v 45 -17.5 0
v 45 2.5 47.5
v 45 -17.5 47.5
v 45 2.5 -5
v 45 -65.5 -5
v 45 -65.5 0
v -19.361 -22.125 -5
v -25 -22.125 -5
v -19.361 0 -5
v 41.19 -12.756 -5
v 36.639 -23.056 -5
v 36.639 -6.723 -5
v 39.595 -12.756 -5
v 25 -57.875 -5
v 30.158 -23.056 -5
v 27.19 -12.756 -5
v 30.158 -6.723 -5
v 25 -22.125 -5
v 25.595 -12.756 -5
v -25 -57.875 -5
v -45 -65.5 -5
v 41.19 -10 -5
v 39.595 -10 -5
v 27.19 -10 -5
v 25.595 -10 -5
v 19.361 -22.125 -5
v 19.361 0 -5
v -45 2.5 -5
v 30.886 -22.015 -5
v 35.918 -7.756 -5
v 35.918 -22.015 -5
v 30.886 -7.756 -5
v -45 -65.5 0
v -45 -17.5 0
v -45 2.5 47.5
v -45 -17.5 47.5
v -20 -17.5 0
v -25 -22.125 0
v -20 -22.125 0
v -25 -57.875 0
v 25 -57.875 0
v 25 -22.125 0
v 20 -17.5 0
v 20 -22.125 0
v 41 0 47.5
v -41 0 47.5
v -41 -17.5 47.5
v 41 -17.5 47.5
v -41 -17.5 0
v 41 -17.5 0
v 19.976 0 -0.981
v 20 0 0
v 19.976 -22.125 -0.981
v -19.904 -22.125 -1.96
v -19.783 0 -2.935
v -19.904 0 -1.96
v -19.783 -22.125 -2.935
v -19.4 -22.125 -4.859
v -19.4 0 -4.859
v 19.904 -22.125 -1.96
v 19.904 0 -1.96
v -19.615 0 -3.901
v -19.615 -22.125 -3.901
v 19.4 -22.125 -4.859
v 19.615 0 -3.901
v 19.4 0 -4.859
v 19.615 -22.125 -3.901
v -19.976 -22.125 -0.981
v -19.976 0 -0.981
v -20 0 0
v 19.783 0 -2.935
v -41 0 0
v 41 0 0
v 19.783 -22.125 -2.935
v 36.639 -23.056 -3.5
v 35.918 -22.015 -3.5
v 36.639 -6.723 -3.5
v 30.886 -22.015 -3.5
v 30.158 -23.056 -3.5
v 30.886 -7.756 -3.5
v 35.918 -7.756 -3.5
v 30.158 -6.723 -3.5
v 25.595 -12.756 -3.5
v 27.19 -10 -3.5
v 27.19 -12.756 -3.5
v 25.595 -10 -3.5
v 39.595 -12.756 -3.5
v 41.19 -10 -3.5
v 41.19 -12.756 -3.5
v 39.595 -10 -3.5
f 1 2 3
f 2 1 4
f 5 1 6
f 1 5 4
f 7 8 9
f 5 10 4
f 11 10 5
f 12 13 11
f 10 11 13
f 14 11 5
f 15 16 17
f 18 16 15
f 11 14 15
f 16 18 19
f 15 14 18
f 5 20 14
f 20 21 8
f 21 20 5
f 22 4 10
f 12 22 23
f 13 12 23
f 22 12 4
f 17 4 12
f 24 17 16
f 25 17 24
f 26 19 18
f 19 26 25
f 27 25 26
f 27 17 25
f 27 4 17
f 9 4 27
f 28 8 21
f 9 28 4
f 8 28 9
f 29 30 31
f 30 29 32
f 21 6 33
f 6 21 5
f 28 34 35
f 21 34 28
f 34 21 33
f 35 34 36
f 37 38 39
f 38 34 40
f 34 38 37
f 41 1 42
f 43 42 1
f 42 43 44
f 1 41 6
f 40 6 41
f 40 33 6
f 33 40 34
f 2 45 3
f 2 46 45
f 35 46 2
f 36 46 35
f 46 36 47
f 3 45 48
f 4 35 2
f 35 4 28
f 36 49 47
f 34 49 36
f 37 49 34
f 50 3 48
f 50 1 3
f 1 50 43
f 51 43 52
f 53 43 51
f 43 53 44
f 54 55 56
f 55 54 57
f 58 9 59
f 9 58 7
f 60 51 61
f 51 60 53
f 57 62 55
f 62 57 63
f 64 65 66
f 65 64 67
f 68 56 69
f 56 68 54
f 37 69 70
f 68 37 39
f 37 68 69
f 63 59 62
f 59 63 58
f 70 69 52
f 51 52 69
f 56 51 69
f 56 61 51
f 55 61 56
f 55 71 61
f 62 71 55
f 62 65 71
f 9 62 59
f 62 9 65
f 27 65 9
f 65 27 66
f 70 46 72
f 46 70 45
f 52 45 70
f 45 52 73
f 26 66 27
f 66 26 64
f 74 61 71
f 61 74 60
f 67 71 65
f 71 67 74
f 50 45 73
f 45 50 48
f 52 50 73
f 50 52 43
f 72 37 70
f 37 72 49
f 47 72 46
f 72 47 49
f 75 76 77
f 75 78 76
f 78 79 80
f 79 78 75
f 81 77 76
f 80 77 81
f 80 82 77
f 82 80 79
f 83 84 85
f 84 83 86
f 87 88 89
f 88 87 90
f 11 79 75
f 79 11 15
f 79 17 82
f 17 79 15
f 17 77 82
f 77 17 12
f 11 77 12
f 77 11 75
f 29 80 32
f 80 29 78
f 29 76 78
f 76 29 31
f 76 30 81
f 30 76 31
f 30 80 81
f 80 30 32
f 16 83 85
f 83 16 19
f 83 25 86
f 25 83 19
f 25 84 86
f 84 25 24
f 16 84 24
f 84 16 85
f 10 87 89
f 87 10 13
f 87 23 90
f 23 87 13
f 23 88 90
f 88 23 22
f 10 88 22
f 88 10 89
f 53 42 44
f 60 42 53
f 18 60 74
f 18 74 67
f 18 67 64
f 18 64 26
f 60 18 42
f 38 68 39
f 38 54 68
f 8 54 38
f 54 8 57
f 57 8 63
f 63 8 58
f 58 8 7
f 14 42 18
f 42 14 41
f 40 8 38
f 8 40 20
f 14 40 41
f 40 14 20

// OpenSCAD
rotate([90.0, 0.0, 0.0])
{
    difference()
    {
        union()
        {
            translate([0.0, -2.5, 0.0])
            {
                linear_extrude(height = 65.5, twist = 0.0, scale = 1.0, slices = 1, center = false)
                {
                    scale([90.0, 5.0])
                    {
                        M22();
                    }
                }
            }
            rotate([90.0, 0.0, 0.0])
            {
                translate([0.0, 7.5, 0.0])
                {
                    translate([0.0, 0.0, -47.5])
                    {
                        linear_extrude(height = 52.5, twist = 0.0, scale = 1.0, slices = 1, center = false)
                        {
                            scale([90.0, 20.0])
                            {
                                M22();
                            }
                        }
                    }
                }
            }
        }
        linear_extrude(height = 40.0, twist = 0.0, scale = 1.0, slices = 1, center = false)
        {
            scale([40.0, 40.0])
            {
                M490();
            }
        }
        translate([0.0, 41.0, 0.0])
        {
            translate([0.0, 0.0, 40.0])
            {
                rotate([90.0, 0.0, 0.0])
                {
                    linear_extrude(height = 110.0, twist = 0.0, scale = 1.0, slices = 1, center = false)
                    {
                        scale([35.0, 35.0])
                        {
                            M490();
                        }
                    }
                }
            }
        }
        translate([0.0, 30.0, 0.0])
        {
            linear_extrude(height = 80.0, twist = 0.0, scale = 1.0, slices = 1, center = false)
            {
                scale([82.0, 59.999])
                {
                    M22();
                }
            }
        }
        translate([0.0, -5.0, 0.0])
        {
            translate([22.5, 0.0, 0.0])
            {
                translate([0.0, 0.0, 10.0])
                {
                    rotate([0.0, 0.0, 0.0])
                    {
                        rotate([90.0, 0.0, 0.0])
                        {
                            linear_extrude(height = 3.0, twist = 0.0, scale = 1.0, slices = 1, center = true)
                            {
                                union()
                                {
                                    translate([0.0, 0.0])
                                    {
                                        M1035();
                                    }
                                    translate([7.0, 0.0])
                                    {
                                        M1036();
                                    }
                                    translate([14.0, 0.0])
                                    {
                                        M1035();
                                    }
                                }
                            }
                        }
                    }
                }
            }
        }
        translate([0.0, 0.0, 40.0])
        {
            rotate([90.0, 0.0, 0.0])
            {
                linear_extrude(height = 20.0, twist = 0.0, scale = 1.0, slices = 1, center = false)
                {
                    scale([50.0, 35.75])
                    {
                        M22();
                    }
                }
            }
        }
    }
}

module M22()
{
    polygon
    (
        points =
        [
            [-0.5, -0.5], 
            [0.5, -0.5], 
            [0.5, 0.5], 
            [-0.5, 0.5]
        ],
        paths =
        [
            [0, 1, 2, 3]
        ]
    );
}

module M490()
{
    polygon
    (
        points =
        [
            [0.5, 0.0], 
            [0.4993977281025862, 0.024533837163709007], 
            [0.49759236333609846, 0.0490085701647803], 
            [0.4945882549823905, 0.07336523722768087], 
            [0.4903926402016152, 0.09754516100806412], 
            [0.485015626597272, 0.12149008995163194], 
            [0.4784701678661044, 0.14514233862723117], 
            [0.4707720325915104, 0.16844492669611003], 
            [0.46193976625564337, 0.1913417161825449], 
            [0.45199464656172167, 0.21377754671514104], 
            [0.4409606321741775, 0.23569836841299882], 
            [0.42886430500013606, 0.25705137209661083], 
            [0.4157348061512726, 0.2777851165098011], 
            [0.40160376574032247, 0.2978496522462167], 
            [0.3865052266813685, 0.31719664208182274], 
            [0.37047556267747955, 0.33577947742350917], 
            [0.3535533905932738, 0.35355339059327373], 
            [0.33577947742350917, 0.37047556267747955], 
            [0.31719664208182274, 0.3865052266813685], 
            [0.29784965224621673, 0.4016037657403224], 
            [0.27778511650980114, 0.4157348061512726], 
            [0.25705137209661083, 0.42886430500013606], 
            [0.2356983684129989, 0.44096063217417747], 
            [0.2137775467151411, 0.45199464656172167], 
            [0.19134171618254492, 0.46193976625564337], 
            [0.16844492669611003, 0.4707720325915104], 
            [0.14514233862723117, 0.47847016786610447], 
            [0.12149008995163199, 0.485015626597272], 
            [0.09754516100806417, 0.4903926402016152], 
            [0.07336523722768087, 0.4945882549823905], 
            [0.049008570164780385, 0.4975923633360984], 
            [0.024533837163709063, 0.4993977281025862], 
            [3.061616997868383E-17, 0.5], 
            [-0.024533837163709004, 0.4993977281025862], 
            [-0.04900857016478032, 0.49759236333609846], 
            [-0.07336523722768082, 0.4945882549823905], 
            [-0.0975451610080641, 0.4903926402016152], 
            [-0.12149008995163194, 0.485015626597272], 
            [-0.14514233862723108, 0.47847016786610447], 
            [-0.16844492669610997, 0.4707720325915104], 
            [-0.19134171618254486, 0.46193976625564337], 
            [-0.21377754671514093, 0.4519946465617217], 
            [-0.23569836841299885, 0.4409606321741775], 
            [-0.25705137209661083, 0.42886430500013606], 
            [-0.277785116509801, 0.41573480615127273], 
            [-0.2978496522462167, 0.40160376574032247], 
            [-0.3171966420818227, 0.38650522668136855], 
            [-0.3357794774235092, 0.3704755626774795], 
            [-0.35355339059327373, 0.3535533905932738], 
            [-0.37047556267747944, 0.3357794774235093], 
            [-0.3865052266813685, 0.31719664208182274], 
            [-0.4016037657403224, 0.29784965224621673], 
            [-0.4157348061512727, 0.2777851165098011], 
            [-0.428864305000136, 0.2570513720966109], 
            [-0.44096063217417747, 0.23569836841299893], 
            [-0.45199464656172167, 0.21377754671514101], 
            [-0.46193976625564337, 0.19134171618254495], 
            [-0.47077203259151035, 0.16844492669611016], 
            [-0.4784701678661044, 0.1451423386272312], 
            [-0.485015626597272, 0.12149008995163203], 
            [-0.4903926402016152, 0.0975451610080643], 
            [-0.4945882549823905, 0.0733652372276809], 
            [-0.4975923633360984, 0.04900857016478041], 
            [-0.4993977281025862, 0.024533837163708983], 
            [-0.5, 6.123233995736766E-17], 
            [-0.4993977281025862, -0.024533837163708862], 
            [-0.49759236333609846, -0.049008570164780295], 
            [-0.4945882549823905, -0.07336523722768079], 
            [-0.4903926402016152, -0.09754516100806418], 
            [-0.485015626597272, -0.12149008995163191], 
            [-0.47847016786610447, -0.14514233862723105], 
            [-0.4707720325915104, -0.16844492669611005], 
            [-0.4619397662556434, -0.19134171618254484], 
            [-0.4519946465617217, -0.2137775467151409], 
            [-0.4409606321741775, -0.23569836841299882], 
            [-0.42886430500013606, -0.2570513720966108], 
            [-0.41573480615127273, -0.277785116509801], 
            [-0.40160376574032247, -0.2978496522462166], 
            [-0.38650522668136855, -0.31719664208182263], 
            [-0.37047556267747955, -0.3357794774235092], 
            [-0.35355339059327384, -0.35355339059327373], 
            [-0.33577947742350933, -0.37047556267747944], 
            [-0.31719664208182297, -0.38650522668136833], 
            [-0.29784965224621657, -0.4016037657403225], 
            [-0.2777851165098011, -0.4157348061512726], 
            [-0.2570513720966109, -0.428864305000136], 
            [-0.23569836841299893, -0.44096063217417747], 
            [-0.21377754671514124, -0.45199464656172156], 
            [-0.19134171618254517, -0.46193976625564326], 
            [-0.16844492669610997, -0.4707720325915104], 
            [-0.14514233862723122, -0.4784701678661044], 
            [-0.12149008995163206, -0.485015626597272], 
            [-0.09754516100806433, -0.49039264020161516], 
            [-0.07336523722768115, -0.49458825498239045], 
            [-0.049008570164780225, -0.49759236333609846], 
            [-0.024533837163709014, -0.4993977281025862], 
            [-9.184850993605148E-17, -0.5], 
            [0.02453383716370883, -0.4993977281025862], 
            [0.049008570164780045, -0.49759236333609846], 
            [0.07336523722768097, -0.49458825498239045], 
            [0.09754516100806415, -0.4903926402016152], 
            [0.12149008995163188, -0.485015626597272], 
            [0.14514233862723103, -0.47847016786610447], 
            [0.1684449266961098, -0.47077203259151046], 
            [0.191341716182545, -0.4619397662556433], 
            [0.21377754671514107, -0.45199464656172167], 
            [0.2356983684129988, -0.4409606321741775], 
            [0.2570513720966108, -0.4288643050001361], 
            [0.2777851165098009, -0.41573480615127273], 
            [0.29784965224621646, -0.40160376574032264], 
            [0.3171966420818228, -0.38650522668136844], 
            [0.33577947742350917, -0.37047556267747955], 
            [0.3535533905932737, -0.35355339059327384], 
            [0.37047556267747944, -0.33577947742350933], 
            [0.38650522668136833, -0.31719664208182297], 
            [0.4016037657403225, -0.2978496522462166], 
            [0.4157348061512726, -0.2777851165098011], 
            [0.428864305000136, -0.25705137209661094], 
            [0.4409606321741774, -0.23569836841299896], 
            [0.45199464656172156, -0.21377754671514126], 
            [0.46193976625564326, -0.1913417161825452], 
            [0.4707720325915104, -0.16844492669611], 
            [0.4784701678661044, -0.14514233862723125], 
            [0.485015626597272, -0.12149008995163209], 
            [0.49039264020161516, -0.09754516100806436], 
            [0.49458825498239045, -0.0733652372276812], 
            [0.49759236333609846, -0.04900857016478025], 
            [0.4993977281025862, -0.024533837163709046]
        ],
        paths =
        [
            [0, 1, 2, 3, 4, 5, 6, 7, 8, 9, 10, 11, 12, 13, 14, 15, 16, 17, 18, 19, 20, 21, 22, 23, 24, 25, 26, 27, 28, 29, 30, 31, 32, 33, 34, 35, 36, 37, 38, 39, 40, 41, 42, 43, 44, 45, 46, 47, 48, 49, 50, 51, 52, 53, 54, 55, 56, 57, 58, 59, 60, 61, 62, 63, 64, 65, 66, 67, 68, 69, 70, 71, 72, 73, 74, 75, 76, 77, 78, 79, 80, 81, 82, 83, 84, 85, 86, 87, 88, 89, 90, 91, 92, 93, 94, 95, 96, 97, 98, 99, 100, 101, 102, 103, 104, 105, 106, 107, 108, 109, 110, 111, 112, 113, 114, 115, 116, 117, 118, 119, 120, 121, 122, 123, 124, 125, 126, 127]
        ]
    );
}

module M1035()
{
    scale([0.9333333333333333, 1.3333333333333333])
    {
        text
        (
            text = ".",
            size = 10.0,
            font = "Consolas:style=Regular",
            halign = "left",
            valign = "baseline",
            spacing = 1.0,
            direction = "ltr",
            language = "en",
            script = "latin",
            $fn = 64
        );
    }
}

module M1036()
{
    scale([0.9333333333333333, 1.3333333333333333])
    {
        text
        (
            text = "͜",
            size = 10.0,
            font = "Consolas:style=Regular",
            halign = "left",
            valign = "baseline",
            spacing = 1.0,
            direction = "ltr",
            language = "en",
            script = "latin",
            $fn = 64
        );
    }
}
